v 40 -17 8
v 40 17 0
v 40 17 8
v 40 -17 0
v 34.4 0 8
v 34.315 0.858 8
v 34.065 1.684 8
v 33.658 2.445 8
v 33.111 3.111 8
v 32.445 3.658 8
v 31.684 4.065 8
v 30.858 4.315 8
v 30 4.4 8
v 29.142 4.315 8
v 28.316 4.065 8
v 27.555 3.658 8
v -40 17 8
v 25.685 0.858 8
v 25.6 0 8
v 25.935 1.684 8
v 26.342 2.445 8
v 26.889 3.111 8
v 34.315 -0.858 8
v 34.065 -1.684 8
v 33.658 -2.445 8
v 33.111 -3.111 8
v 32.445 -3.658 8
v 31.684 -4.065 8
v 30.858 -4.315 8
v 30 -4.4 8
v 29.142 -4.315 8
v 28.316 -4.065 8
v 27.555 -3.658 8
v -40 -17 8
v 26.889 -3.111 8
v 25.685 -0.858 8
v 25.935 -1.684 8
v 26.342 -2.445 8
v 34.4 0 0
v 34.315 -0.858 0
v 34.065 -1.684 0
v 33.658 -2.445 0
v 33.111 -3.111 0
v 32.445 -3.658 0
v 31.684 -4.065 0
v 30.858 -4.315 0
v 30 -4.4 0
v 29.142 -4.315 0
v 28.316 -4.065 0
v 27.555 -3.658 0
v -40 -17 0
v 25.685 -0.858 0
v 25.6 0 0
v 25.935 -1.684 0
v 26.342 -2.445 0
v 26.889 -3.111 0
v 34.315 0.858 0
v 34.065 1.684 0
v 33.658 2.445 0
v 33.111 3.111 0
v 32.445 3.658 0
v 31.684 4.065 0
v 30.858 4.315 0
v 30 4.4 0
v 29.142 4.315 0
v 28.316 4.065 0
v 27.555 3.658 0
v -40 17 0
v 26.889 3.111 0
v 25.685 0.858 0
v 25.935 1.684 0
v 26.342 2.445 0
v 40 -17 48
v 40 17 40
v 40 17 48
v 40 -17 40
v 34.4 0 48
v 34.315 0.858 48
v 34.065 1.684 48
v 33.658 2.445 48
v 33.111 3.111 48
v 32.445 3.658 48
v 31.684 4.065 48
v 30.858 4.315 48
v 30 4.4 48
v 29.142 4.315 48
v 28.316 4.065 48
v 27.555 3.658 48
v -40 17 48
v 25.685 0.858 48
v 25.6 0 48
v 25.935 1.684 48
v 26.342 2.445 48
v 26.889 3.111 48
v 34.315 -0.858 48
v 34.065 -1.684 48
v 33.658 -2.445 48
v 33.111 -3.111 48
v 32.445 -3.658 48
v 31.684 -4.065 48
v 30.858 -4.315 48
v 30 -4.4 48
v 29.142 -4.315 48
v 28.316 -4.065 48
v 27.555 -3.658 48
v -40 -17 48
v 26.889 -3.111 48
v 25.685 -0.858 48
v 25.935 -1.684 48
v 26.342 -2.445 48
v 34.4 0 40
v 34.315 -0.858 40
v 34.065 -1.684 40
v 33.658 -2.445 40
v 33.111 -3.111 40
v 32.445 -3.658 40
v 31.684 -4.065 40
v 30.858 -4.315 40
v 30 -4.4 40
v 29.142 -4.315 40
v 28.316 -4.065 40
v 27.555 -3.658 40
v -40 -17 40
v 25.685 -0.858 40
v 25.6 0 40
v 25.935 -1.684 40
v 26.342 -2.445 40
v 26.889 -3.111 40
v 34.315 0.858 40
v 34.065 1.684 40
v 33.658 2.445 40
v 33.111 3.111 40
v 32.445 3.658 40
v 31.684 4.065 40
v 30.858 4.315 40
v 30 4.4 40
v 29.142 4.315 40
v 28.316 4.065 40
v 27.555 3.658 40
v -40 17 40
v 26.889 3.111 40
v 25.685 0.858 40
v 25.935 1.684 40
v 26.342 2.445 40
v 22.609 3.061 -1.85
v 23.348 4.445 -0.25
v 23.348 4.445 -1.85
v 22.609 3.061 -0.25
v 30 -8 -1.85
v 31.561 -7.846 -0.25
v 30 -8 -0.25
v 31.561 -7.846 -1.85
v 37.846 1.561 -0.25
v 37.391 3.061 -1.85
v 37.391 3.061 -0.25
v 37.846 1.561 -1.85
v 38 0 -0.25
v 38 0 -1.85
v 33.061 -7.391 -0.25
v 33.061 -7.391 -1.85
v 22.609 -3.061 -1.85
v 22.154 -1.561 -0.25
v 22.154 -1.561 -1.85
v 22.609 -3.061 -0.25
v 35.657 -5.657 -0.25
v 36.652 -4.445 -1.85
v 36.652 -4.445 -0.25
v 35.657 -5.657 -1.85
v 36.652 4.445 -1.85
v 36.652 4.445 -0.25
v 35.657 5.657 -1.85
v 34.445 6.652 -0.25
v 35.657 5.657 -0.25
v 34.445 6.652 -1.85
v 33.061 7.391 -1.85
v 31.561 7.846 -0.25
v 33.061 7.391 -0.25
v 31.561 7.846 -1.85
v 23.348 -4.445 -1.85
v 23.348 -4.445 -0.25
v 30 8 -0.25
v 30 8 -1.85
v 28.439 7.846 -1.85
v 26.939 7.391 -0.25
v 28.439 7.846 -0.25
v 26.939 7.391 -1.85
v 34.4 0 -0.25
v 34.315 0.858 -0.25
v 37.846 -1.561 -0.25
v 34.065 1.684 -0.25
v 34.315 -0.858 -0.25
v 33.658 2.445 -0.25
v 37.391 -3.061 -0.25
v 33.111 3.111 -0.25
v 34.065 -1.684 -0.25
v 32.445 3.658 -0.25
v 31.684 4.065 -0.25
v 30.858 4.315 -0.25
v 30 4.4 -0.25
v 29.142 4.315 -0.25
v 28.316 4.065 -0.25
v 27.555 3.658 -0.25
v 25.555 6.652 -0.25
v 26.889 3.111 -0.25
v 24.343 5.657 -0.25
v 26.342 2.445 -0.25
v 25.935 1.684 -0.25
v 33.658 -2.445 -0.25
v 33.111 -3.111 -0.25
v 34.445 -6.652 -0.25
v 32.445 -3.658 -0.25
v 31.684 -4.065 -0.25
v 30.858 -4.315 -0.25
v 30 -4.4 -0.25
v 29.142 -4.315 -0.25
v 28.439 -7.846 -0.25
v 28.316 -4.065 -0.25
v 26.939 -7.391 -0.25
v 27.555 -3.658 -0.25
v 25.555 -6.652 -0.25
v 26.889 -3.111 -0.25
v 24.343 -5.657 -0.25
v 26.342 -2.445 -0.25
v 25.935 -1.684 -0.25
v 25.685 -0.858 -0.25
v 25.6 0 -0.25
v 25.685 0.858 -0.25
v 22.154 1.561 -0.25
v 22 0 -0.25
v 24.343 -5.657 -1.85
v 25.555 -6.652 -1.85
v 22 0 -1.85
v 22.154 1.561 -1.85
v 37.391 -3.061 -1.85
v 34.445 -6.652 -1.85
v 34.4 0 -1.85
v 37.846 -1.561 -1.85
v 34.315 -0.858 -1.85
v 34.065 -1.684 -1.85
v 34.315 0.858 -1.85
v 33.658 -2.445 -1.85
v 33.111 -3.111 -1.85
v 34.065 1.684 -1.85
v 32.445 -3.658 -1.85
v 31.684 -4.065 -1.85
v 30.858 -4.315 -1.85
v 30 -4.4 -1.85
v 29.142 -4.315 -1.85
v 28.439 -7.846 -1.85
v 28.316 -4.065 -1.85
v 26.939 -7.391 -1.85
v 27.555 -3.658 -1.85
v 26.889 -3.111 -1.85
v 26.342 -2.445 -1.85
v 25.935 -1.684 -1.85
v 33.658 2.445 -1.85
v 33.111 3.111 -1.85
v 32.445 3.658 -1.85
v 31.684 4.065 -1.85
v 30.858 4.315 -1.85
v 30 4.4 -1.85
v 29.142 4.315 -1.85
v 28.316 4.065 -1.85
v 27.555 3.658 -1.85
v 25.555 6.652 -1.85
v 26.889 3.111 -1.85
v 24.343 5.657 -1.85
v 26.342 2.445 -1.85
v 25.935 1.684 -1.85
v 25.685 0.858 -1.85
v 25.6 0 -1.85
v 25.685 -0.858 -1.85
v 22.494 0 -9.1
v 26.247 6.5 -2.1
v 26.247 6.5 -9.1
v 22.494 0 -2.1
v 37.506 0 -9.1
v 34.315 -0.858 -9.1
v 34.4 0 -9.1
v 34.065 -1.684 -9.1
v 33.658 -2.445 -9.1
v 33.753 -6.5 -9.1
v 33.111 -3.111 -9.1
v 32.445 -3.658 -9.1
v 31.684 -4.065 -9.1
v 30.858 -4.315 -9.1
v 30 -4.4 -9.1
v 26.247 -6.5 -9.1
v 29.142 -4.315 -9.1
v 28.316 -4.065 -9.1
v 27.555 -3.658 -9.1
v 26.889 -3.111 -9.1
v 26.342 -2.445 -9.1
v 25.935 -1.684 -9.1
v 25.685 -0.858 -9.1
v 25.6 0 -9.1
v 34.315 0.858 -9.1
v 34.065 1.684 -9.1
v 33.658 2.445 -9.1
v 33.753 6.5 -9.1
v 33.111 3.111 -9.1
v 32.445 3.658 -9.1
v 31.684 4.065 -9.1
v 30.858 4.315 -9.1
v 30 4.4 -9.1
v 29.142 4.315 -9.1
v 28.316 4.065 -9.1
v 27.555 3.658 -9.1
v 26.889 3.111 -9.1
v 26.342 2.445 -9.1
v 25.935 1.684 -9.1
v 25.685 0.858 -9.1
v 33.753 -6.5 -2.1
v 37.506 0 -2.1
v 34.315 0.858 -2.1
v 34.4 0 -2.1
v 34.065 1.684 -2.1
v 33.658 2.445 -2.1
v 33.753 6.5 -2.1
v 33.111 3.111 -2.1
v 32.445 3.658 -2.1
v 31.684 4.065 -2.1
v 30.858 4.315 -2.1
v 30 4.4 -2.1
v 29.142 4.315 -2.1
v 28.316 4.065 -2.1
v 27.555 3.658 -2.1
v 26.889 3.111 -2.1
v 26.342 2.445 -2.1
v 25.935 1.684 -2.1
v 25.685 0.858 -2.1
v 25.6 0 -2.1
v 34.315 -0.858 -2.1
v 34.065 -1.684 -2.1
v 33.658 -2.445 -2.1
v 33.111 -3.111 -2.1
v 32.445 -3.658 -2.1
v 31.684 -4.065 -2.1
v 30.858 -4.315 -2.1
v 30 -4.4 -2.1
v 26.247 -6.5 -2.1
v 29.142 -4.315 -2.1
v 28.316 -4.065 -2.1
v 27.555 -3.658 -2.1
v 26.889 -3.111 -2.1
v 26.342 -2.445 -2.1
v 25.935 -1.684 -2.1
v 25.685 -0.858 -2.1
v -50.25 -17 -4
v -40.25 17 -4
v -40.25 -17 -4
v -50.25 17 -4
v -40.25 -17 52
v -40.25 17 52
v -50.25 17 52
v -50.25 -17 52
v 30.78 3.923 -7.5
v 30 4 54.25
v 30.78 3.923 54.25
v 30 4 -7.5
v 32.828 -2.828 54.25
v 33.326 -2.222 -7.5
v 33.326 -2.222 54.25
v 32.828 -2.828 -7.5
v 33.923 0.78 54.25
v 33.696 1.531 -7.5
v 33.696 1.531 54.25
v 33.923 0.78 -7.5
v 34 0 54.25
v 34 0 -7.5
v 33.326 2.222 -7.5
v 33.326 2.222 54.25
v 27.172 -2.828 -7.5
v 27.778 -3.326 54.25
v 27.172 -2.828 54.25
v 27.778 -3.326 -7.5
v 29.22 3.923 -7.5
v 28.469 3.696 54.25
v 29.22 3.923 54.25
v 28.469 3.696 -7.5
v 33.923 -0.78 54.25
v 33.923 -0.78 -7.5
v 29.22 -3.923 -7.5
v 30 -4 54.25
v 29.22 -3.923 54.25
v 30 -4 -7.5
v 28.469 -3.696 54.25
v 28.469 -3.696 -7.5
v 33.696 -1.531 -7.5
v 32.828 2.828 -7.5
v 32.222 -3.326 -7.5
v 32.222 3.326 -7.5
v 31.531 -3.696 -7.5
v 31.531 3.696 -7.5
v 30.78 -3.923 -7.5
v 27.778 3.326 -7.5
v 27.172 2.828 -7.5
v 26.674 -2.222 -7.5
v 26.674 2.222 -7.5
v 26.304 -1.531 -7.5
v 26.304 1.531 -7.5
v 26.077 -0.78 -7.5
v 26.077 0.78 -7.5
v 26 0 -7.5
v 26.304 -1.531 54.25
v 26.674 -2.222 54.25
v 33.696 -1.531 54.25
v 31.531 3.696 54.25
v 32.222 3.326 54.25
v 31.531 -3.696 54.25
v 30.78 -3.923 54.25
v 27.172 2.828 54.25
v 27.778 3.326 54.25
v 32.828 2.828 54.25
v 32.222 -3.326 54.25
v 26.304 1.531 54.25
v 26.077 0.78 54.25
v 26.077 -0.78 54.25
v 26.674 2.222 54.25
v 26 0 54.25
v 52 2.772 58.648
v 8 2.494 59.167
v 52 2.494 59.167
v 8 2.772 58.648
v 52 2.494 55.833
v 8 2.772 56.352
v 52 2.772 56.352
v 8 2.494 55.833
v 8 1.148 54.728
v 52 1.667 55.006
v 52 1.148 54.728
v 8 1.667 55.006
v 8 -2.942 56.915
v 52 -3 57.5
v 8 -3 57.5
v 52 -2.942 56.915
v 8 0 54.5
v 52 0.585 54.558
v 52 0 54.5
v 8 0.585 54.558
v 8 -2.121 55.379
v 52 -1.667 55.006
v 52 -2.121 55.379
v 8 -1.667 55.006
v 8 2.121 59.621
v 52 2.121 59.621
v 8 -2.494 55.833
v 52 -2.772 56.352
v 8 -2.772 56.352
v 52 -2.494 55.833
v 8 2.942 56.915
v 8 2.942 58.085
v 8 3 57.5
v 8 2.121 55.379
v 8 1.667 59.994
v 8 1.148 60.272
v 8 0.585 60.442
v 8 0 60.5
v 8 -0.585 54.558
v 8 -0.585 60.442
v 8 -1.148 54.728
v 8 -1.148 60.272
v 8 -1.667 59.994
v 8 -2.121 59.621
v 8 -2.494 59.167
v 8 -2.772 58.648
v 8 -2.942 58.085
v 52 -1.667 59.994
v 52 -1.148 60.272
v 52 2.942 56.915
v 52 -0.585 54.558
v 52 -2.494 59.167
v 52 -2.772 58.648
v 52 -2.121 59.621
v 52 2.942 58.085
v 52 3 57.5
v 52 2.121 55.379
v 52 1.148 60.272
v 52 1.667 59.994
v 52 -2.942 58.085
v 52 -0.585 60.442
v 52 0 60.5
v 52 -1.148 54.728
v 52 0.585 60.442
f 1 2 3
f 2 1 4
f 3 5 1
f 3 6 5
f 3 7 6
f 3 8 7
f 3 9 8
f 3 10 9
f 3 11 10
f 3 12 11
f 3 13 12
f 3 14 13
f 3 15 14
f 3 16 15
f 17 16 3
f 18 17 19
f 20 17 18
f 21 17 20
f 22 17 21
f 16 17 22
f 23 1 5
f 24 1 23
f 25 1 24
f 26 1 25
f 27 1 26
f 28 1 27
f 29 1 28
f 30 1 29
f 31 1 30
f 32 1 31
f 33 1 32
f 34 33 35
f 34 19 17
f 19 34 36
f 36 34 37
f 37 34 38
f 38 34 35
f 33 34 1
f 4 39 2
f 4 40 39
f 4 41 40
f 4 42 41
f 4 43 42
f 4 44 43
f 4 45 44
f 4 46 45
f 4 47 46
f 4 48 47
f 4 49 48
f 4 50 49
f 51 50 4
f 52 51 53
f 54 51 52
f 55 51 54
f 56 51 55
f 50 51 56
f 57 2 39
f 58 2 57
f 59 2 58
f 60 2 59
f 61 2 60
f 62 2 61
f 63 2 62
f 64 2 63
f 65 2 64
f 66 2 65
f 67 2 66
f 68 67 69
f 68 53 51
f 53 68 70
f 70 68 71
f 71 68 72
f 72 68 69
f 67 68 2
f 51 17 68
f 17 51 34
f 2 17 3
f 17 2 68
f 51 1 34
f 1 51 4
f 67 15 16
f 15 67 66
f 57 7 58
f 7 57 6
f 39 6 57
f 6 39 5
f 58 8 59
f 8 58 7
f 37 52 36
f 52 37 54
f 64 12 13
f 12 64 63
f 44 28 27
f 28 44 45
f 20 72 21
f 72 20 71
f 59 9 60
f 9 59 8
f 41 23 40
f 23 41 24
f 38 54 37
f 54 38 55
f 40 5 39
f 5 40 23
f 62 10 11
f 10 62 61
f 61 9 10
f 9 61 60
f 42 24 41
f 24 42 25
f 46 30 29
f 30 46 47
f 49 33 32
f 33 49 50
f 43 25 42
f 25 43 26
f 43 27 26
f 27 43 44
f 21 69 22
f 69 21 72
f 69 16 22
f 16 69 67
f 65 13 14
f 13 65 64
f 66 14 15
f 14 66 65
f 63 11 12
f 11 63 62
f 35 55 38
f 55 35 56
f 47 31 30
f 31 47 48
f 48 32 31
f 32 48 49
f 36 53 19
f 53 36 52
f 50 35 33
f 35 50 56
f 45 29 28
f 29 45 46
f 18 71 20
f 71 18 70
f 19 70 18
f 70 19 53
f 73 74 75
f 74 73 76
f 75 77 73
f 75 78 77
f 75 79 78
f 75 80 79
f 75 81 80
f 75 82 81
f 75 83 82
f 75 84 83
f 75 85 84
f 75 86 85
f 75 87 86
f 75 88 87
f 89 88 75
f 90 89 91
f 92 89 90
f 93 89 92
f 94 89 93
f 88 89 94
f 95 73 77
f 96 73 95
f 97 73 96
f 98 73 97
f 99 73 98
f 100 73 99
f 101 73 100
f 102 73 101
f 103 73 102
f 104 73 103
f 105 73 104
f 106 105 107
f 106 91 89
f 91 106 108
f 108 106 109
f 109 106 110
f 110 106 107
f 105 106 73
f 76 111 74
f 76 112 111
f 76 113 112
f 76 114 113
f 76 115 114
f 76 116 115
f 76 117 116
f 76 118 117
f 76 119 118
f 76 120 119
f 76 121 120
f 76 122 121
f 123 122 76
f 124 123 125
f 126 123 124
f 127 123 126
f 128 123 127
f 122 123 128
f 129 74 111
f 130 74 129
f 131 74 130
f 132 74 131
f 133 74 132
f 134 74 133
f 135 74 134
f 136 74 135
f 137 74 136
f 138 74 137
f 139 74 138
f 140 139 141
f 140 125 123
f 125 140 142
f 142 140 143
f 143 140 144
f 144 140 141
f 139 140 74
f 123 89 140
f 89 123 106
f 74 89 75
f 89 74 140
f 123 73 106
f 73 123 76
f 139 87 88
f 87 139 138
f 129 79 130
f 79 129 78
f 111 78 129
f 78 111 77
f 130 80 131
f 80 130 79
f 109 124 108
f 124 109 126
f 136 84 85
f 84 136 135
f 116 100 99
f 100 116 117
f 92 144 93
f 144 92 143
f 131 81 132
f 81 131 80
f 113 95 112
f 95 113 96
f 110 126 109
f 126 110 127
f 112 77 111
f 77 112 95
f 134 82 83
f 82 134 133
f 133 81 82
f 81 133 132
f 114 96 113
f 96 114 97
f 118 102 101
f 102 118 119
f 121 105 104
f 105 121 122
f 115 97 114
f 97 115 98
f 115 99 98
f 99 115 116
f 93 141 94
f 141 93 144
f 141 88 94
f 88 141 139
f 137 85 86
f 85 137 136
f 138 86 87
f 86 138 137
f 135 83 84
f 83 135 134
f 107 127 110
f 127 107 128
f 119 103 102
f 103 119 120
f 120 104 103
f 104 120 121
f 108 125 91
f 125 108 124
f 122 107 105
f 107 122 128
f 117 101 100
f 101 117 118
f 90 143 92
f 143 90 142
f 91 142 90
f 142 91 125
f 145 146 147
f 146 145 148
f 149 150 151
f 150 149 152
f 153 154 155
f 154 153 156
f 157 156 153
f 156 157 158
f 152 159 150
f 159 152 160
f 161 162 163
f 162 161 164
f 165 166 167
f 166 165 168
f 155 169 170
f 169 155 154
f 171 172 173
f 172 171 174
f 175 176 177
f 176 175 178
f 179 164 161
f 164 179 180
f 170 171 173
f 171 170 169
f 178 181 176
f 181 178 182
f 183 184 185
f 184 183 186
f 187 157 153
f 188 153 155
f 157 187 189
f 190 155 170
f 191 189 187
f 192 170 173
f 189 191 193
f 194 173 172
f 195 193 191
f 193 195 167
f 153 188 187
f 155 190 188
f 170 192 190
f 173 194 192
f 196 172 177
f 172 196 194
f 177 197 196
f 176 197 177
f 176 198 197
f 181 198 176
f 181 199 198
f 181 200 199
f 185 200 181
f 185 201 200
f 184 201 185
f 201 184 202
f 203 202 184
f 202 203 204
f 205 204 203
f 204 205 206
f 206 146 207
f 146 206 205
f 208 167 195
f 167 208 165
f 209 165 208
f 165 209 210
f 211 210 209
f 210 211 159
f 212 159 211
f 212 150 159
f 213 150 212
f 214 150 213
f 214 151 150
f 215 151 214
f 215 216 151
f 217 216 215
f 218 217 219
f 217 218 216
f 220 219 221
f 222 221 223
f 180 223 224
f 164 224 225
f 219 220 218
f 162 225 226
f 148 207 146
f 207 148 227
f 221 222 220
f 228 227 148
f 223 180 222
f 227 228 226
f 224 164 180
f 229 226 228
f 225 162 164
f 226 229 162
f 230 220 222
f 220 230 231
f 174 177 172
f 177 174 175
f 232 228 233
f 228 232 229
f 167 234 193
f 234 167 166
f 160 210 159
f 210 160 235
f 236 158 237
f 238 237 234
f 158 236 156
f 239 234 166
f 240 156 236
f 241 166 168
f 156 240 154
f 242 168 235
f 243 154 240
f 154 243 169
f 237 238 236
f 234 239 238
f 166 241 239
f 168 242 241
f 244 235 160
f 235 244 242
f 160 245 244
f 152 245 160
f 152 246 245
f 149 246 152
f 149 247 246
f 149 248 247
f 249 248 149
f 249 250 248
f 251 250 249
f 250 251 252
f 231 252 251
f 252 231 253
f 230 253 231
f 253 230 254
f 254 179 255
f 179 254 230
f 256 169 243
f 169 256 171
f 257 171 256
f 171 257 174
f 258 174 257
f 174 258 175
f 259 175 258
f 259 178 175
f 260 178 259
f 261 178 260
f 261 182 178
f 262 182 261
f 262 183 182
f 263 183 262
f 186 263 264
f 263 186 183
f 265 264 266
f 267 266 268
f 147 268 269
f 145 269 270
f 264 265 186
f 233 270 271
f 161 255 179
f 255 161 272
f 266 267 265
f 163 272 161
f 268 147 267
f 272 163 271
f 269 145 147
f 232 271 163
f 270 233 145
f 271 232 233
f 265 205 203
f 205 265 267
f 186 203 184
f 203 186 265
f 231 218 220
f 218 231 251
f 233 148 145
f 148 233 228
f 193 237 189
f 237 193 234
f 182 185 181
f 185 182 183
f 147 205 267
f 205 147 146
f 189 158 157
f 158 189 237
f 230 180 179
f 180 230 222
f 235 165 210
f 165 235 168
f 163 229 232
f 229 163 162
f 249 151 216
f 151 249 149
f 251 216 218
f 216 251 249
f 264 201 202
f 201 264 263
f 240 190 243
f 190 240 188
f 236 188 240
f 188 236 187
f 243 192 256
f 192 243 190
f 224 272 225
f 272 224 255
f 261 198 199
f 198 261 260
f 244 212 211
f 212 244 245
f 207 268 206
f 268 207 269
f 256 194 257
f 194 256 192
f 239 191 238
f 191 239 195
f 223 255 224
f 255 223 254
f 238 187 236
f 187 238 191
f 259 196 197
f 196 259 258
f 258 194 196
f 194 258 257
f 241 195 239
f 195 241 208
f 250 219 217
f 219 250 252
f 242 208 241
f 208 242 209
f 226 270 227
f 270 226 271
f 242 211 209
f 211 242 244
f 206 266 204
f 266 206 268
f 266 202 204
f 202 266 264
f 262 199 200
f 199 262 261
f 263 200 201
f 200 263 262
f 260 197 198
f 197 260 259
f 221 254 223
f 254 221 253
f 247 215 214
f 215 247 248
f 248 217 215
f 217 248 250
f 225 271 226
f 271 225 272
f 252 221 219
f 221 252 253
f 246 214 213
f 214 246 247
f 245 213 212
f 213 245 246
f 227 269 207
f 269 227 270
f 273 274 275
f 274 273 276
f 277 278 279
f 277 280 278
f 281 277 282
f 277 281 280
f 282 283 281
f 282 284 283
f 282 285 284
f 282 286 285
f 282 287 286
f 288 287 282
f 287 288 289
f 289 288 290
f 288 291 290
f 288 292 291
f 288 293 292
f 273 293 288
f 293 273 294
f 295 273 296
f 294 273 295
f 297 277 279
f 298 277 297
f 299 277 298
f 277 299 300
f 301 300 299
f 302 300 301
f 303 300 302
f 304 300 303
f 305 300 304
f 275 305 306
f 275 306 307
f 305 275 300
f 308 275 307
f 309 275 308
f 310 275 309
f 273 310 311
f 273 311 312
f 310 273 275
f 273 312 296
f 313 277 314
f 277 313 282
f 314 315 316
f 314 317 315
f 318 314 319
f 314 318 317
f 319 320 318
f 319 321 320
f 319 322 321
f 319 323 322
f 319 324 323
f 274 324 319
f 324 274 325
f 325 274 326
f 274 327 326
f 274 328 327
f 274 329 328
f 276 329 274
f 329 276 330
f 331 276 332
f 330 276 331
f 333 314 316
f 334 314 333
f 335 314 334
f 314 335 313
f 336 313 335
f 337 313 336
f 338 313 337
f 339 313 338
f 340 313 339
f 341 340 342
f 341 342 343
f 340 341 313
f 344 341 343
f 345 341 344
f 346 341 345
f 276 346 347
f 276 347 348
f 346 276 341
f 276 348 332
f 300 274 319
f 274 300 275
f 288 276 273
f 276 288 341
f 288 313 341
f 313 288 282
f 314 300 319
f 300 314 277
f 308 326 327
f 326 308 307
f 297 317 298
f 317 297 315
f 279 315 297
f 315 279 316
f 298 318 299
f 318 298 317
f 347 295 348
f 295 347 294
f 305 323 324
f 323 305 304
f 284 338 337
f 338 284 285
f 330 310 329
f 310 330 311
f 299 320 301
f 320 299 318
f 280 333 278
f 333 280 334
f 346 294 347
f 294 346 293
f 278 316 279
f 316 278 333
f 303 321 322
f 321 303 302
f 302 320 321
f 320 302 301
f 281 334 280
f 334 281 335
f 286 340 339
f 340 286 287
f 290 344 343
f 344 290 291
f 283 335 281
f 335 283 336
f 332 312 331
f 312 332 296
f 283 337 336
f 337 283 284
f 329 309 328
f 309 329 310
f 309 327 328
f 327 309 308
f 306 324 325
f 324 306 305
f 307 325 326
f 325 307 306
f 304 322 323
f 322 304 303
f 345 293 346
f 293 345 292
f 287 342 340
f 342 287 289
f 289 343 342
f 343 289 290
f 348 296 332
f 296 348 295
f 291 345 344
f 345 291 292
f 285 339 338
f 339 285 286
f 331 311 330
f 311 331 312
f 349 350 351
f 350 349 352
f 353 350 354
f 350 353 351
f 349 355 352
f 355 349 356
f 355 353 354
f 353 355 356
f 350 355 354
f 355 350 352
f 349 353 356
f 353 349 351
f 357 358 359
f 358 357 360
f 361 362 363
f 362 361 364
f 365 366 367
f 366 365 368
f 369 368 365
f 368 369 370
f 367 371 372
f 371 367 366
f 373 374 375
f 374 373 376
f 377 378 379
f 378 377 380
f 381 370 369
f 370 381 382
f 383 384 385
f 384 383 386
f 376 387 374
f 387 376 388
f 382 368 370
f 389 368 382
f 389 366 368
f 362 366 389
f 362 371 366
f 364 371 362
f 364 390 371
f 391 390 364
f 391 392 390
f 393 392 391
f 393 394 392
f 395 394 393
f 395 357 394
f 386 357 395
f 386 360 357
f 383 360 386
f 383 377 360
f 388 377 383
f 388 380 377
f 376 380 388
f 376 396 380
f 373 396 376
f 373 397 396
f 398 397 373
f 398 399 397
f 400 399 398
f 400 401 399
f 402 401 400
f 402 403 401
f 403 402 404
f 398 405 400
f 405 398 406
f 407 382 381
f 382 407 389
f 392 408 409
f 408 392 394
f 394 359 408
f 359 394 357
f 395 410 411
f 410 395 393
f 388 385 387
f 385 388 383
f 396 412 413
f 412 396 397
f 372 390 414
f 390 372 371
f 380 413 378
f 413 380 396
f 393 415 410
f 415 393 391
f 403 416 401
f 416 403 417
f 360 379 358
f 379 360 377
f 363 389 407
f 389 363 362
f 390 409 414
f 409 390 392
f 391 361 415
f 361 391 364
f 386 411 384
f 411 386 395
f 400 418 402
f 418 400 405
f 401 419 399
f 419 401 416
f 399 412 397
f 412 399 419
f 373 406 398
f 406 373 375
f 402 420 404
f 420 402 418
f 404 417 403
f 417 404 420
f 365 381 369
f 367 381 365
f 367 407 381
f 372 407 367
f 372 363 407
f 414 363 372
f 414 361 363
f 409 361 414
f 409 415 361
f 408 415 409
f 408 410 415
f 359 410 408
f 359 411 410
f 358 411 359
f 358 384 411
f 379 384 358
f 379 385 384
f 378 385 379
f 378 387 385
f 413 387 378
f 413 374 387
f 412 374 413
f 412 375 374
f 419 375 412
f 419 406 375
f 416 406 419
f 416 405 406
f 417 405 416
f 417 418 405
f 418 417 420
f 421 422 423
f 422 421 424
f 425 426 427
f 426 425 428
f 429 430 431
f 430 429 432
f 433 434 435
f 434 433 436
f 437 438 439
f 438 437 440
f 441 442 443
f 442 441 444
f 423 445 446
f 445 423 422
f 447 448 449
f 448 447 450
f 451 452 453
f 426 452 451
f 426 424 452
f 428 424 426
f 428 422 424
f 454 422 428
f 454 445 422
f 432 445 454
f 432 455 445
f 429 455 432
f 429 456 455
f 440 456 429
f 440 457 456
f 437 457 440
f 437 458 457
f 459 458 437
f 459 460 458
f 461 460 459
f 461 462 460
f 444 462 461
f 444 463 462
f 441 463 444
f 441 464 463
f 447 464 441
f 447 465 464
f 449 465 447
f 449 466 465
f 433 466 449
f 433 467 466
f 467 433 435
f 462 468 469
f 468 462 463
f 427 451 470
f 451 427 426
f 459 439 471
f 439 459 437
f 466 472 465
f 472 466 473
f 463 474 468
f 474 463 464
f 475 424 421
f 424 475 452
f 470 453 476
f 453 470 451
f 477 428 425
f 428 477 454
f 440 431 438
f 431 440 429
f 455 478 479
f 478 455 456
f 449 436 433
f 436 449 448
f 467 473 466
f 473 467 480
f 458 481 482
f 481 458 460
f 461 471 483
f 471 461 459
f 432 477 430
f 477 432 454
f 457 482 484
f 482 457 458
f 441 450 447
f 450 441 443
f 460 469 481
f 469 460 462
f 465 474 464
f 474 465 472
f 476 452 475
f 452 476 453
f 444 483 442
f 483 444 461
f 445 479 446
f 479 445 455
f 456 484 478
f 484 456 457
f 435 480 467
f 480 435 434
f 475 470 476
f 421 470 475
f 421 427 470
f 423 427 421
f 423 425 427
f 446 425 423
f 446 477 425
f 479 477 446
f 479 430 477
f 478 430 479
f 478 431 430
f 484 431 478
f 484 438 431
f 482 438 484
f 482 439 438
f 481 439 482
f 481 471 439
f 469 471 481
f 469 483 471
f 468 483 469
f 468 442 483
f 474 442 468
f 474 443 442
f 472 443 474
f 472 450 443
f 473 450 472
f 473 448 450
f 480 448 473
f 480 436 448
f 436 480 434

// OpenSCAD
$fn = 32;

// ------------------------------------------------------------------------
// C clamp: throat 40 mm, screw d8
// Every part is its own module, assembly() places every instance.
// ------------------------------------------------------------------------

// --- part 1 ---
module clamp_arm() {
  difference() {
    translate([-40, -17, 0]) cube([80, 34, 8]);
    translate([30, 0, -1]) cylinder(h = 10, d = 8.8);
  }
}

// --- part 2 ---
module clamp_spine() {
  difference() {
    translate([-28, -17, 0]) cube([56, 34, 10]);
  }
}

// --- part 3 ---
module clamp_screw() {
  translate([0, 0, -30.875]) cylinder(h = 61.75, d = 8);
}

// --- part 4 ---
module clamp_washer() {
  difference() {
      translate([0, 0, 0]) cylinder(h = 1.6, d = 16);
      translate([0, 0, -1]) cylinder(h = 3.6, d = 8.8);
    }
}

// --- part 5 ---
module clamp_nut() {
  difference() {
    linear_extrude(height = 7) polygon(points = [[7.506, 0], [3.753, 6.5], [-3.753, 6.5], [-7.506, 0], [-3.753, -6.5], [3.753, -6.5]]);
    translate([0, 0, -1]) cylinder(h = 9, d = 8.8);
  }
}

// --- part 6 ---
module tommy_bar() {
  translate([0, 0, -22]) cylinder(h = 44, d = 6);
}

// --- assembly ---
module assembly() {
  color([0.80, 0.24, 0.20]) translate([0, 0, 0]) rotate([0, 0, 0]) clamp_arm();
  color([0.20, 0.45, 0.75]) translate([0, 0, 40]) rotate([0, 0, 0]) clamp_arm();
  color([0.25, 0.62, 0.32]) translate([-50.25, 0, 24]) rotate([0, 90, 0]) clamp_spine();
  color([0.92, 0.70, 0.18]) translate([30, 0, 23.375]) rotate([0, 0, 0]) clamp_screw();
  color([0.58, 0.35, 0.70]) translate([30, 0, -1.85]) rotate([0, 0, 0]) clamp_washer();
  color([0.16, 0.66, 0.66]) translate([30, 0, -9.1]) rotate([0, 0, 0]) clamp_nut();
  color([0.85, 0.48, 0.18]) translate([30, 0, 57.5]) rotate([0, 90, 0]) tommy_bar();
}

assembly();
